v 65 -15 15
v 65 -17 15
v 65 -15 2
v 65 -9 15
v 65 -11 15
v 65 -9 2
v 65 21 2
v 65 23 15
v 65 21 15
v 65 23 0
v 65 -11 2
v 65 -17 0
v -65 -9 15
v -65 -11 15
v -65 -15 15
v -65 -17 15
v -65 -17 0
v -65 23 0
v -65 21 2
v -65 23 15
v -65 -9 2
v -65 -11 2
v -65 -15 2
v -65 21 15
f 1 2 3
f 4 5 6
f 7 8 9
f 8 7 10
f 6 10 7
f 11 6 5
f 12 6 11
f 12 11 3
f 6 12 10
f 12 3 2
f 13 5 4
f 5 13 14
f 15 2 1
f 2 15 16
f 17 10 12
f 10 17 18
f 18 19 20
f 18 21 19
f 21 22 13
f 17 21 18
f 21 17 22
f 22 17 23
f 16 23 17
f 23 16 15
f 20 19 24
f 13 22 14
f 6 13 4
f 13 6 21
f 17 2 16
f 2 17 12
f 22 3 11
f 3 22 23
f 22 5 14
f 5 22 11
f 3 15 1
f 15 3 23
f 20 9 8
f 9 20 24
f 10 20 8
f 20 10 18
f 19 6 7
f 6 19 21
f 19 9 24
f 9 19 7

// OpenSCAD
wall_thickness = 2;
tray_height = 15;
tray_width = 30;
clip_height = 15;
clip_width = 4;
holder_length = 130;

module marker_holder() {
  translate([-holder_length / 2, -(clip_width + tray_width) / 2, 0]) {
		union() {
      	difference() {
        		cube([holder_length, clip_width + 2 * wall_thickness, clip_height]);
        			translate([0, wall_thickness, wall_thickness]) {
          			cube([holder_length, clip_width, clip_height]);
      			}
    		}
    		translate([0, clip_width + wall_thickness, 0]) {
      		difference() {
        			cube([holder_length, tray_width + 2 * wall_thickness, tray_height]);
        				translate([0, wall_thickness, wall_thickness]) {
          				cube([holder_length, tray_width, tray_height]);
						}
        		}
      	}
    	}
  	}
}

marker_holder();

